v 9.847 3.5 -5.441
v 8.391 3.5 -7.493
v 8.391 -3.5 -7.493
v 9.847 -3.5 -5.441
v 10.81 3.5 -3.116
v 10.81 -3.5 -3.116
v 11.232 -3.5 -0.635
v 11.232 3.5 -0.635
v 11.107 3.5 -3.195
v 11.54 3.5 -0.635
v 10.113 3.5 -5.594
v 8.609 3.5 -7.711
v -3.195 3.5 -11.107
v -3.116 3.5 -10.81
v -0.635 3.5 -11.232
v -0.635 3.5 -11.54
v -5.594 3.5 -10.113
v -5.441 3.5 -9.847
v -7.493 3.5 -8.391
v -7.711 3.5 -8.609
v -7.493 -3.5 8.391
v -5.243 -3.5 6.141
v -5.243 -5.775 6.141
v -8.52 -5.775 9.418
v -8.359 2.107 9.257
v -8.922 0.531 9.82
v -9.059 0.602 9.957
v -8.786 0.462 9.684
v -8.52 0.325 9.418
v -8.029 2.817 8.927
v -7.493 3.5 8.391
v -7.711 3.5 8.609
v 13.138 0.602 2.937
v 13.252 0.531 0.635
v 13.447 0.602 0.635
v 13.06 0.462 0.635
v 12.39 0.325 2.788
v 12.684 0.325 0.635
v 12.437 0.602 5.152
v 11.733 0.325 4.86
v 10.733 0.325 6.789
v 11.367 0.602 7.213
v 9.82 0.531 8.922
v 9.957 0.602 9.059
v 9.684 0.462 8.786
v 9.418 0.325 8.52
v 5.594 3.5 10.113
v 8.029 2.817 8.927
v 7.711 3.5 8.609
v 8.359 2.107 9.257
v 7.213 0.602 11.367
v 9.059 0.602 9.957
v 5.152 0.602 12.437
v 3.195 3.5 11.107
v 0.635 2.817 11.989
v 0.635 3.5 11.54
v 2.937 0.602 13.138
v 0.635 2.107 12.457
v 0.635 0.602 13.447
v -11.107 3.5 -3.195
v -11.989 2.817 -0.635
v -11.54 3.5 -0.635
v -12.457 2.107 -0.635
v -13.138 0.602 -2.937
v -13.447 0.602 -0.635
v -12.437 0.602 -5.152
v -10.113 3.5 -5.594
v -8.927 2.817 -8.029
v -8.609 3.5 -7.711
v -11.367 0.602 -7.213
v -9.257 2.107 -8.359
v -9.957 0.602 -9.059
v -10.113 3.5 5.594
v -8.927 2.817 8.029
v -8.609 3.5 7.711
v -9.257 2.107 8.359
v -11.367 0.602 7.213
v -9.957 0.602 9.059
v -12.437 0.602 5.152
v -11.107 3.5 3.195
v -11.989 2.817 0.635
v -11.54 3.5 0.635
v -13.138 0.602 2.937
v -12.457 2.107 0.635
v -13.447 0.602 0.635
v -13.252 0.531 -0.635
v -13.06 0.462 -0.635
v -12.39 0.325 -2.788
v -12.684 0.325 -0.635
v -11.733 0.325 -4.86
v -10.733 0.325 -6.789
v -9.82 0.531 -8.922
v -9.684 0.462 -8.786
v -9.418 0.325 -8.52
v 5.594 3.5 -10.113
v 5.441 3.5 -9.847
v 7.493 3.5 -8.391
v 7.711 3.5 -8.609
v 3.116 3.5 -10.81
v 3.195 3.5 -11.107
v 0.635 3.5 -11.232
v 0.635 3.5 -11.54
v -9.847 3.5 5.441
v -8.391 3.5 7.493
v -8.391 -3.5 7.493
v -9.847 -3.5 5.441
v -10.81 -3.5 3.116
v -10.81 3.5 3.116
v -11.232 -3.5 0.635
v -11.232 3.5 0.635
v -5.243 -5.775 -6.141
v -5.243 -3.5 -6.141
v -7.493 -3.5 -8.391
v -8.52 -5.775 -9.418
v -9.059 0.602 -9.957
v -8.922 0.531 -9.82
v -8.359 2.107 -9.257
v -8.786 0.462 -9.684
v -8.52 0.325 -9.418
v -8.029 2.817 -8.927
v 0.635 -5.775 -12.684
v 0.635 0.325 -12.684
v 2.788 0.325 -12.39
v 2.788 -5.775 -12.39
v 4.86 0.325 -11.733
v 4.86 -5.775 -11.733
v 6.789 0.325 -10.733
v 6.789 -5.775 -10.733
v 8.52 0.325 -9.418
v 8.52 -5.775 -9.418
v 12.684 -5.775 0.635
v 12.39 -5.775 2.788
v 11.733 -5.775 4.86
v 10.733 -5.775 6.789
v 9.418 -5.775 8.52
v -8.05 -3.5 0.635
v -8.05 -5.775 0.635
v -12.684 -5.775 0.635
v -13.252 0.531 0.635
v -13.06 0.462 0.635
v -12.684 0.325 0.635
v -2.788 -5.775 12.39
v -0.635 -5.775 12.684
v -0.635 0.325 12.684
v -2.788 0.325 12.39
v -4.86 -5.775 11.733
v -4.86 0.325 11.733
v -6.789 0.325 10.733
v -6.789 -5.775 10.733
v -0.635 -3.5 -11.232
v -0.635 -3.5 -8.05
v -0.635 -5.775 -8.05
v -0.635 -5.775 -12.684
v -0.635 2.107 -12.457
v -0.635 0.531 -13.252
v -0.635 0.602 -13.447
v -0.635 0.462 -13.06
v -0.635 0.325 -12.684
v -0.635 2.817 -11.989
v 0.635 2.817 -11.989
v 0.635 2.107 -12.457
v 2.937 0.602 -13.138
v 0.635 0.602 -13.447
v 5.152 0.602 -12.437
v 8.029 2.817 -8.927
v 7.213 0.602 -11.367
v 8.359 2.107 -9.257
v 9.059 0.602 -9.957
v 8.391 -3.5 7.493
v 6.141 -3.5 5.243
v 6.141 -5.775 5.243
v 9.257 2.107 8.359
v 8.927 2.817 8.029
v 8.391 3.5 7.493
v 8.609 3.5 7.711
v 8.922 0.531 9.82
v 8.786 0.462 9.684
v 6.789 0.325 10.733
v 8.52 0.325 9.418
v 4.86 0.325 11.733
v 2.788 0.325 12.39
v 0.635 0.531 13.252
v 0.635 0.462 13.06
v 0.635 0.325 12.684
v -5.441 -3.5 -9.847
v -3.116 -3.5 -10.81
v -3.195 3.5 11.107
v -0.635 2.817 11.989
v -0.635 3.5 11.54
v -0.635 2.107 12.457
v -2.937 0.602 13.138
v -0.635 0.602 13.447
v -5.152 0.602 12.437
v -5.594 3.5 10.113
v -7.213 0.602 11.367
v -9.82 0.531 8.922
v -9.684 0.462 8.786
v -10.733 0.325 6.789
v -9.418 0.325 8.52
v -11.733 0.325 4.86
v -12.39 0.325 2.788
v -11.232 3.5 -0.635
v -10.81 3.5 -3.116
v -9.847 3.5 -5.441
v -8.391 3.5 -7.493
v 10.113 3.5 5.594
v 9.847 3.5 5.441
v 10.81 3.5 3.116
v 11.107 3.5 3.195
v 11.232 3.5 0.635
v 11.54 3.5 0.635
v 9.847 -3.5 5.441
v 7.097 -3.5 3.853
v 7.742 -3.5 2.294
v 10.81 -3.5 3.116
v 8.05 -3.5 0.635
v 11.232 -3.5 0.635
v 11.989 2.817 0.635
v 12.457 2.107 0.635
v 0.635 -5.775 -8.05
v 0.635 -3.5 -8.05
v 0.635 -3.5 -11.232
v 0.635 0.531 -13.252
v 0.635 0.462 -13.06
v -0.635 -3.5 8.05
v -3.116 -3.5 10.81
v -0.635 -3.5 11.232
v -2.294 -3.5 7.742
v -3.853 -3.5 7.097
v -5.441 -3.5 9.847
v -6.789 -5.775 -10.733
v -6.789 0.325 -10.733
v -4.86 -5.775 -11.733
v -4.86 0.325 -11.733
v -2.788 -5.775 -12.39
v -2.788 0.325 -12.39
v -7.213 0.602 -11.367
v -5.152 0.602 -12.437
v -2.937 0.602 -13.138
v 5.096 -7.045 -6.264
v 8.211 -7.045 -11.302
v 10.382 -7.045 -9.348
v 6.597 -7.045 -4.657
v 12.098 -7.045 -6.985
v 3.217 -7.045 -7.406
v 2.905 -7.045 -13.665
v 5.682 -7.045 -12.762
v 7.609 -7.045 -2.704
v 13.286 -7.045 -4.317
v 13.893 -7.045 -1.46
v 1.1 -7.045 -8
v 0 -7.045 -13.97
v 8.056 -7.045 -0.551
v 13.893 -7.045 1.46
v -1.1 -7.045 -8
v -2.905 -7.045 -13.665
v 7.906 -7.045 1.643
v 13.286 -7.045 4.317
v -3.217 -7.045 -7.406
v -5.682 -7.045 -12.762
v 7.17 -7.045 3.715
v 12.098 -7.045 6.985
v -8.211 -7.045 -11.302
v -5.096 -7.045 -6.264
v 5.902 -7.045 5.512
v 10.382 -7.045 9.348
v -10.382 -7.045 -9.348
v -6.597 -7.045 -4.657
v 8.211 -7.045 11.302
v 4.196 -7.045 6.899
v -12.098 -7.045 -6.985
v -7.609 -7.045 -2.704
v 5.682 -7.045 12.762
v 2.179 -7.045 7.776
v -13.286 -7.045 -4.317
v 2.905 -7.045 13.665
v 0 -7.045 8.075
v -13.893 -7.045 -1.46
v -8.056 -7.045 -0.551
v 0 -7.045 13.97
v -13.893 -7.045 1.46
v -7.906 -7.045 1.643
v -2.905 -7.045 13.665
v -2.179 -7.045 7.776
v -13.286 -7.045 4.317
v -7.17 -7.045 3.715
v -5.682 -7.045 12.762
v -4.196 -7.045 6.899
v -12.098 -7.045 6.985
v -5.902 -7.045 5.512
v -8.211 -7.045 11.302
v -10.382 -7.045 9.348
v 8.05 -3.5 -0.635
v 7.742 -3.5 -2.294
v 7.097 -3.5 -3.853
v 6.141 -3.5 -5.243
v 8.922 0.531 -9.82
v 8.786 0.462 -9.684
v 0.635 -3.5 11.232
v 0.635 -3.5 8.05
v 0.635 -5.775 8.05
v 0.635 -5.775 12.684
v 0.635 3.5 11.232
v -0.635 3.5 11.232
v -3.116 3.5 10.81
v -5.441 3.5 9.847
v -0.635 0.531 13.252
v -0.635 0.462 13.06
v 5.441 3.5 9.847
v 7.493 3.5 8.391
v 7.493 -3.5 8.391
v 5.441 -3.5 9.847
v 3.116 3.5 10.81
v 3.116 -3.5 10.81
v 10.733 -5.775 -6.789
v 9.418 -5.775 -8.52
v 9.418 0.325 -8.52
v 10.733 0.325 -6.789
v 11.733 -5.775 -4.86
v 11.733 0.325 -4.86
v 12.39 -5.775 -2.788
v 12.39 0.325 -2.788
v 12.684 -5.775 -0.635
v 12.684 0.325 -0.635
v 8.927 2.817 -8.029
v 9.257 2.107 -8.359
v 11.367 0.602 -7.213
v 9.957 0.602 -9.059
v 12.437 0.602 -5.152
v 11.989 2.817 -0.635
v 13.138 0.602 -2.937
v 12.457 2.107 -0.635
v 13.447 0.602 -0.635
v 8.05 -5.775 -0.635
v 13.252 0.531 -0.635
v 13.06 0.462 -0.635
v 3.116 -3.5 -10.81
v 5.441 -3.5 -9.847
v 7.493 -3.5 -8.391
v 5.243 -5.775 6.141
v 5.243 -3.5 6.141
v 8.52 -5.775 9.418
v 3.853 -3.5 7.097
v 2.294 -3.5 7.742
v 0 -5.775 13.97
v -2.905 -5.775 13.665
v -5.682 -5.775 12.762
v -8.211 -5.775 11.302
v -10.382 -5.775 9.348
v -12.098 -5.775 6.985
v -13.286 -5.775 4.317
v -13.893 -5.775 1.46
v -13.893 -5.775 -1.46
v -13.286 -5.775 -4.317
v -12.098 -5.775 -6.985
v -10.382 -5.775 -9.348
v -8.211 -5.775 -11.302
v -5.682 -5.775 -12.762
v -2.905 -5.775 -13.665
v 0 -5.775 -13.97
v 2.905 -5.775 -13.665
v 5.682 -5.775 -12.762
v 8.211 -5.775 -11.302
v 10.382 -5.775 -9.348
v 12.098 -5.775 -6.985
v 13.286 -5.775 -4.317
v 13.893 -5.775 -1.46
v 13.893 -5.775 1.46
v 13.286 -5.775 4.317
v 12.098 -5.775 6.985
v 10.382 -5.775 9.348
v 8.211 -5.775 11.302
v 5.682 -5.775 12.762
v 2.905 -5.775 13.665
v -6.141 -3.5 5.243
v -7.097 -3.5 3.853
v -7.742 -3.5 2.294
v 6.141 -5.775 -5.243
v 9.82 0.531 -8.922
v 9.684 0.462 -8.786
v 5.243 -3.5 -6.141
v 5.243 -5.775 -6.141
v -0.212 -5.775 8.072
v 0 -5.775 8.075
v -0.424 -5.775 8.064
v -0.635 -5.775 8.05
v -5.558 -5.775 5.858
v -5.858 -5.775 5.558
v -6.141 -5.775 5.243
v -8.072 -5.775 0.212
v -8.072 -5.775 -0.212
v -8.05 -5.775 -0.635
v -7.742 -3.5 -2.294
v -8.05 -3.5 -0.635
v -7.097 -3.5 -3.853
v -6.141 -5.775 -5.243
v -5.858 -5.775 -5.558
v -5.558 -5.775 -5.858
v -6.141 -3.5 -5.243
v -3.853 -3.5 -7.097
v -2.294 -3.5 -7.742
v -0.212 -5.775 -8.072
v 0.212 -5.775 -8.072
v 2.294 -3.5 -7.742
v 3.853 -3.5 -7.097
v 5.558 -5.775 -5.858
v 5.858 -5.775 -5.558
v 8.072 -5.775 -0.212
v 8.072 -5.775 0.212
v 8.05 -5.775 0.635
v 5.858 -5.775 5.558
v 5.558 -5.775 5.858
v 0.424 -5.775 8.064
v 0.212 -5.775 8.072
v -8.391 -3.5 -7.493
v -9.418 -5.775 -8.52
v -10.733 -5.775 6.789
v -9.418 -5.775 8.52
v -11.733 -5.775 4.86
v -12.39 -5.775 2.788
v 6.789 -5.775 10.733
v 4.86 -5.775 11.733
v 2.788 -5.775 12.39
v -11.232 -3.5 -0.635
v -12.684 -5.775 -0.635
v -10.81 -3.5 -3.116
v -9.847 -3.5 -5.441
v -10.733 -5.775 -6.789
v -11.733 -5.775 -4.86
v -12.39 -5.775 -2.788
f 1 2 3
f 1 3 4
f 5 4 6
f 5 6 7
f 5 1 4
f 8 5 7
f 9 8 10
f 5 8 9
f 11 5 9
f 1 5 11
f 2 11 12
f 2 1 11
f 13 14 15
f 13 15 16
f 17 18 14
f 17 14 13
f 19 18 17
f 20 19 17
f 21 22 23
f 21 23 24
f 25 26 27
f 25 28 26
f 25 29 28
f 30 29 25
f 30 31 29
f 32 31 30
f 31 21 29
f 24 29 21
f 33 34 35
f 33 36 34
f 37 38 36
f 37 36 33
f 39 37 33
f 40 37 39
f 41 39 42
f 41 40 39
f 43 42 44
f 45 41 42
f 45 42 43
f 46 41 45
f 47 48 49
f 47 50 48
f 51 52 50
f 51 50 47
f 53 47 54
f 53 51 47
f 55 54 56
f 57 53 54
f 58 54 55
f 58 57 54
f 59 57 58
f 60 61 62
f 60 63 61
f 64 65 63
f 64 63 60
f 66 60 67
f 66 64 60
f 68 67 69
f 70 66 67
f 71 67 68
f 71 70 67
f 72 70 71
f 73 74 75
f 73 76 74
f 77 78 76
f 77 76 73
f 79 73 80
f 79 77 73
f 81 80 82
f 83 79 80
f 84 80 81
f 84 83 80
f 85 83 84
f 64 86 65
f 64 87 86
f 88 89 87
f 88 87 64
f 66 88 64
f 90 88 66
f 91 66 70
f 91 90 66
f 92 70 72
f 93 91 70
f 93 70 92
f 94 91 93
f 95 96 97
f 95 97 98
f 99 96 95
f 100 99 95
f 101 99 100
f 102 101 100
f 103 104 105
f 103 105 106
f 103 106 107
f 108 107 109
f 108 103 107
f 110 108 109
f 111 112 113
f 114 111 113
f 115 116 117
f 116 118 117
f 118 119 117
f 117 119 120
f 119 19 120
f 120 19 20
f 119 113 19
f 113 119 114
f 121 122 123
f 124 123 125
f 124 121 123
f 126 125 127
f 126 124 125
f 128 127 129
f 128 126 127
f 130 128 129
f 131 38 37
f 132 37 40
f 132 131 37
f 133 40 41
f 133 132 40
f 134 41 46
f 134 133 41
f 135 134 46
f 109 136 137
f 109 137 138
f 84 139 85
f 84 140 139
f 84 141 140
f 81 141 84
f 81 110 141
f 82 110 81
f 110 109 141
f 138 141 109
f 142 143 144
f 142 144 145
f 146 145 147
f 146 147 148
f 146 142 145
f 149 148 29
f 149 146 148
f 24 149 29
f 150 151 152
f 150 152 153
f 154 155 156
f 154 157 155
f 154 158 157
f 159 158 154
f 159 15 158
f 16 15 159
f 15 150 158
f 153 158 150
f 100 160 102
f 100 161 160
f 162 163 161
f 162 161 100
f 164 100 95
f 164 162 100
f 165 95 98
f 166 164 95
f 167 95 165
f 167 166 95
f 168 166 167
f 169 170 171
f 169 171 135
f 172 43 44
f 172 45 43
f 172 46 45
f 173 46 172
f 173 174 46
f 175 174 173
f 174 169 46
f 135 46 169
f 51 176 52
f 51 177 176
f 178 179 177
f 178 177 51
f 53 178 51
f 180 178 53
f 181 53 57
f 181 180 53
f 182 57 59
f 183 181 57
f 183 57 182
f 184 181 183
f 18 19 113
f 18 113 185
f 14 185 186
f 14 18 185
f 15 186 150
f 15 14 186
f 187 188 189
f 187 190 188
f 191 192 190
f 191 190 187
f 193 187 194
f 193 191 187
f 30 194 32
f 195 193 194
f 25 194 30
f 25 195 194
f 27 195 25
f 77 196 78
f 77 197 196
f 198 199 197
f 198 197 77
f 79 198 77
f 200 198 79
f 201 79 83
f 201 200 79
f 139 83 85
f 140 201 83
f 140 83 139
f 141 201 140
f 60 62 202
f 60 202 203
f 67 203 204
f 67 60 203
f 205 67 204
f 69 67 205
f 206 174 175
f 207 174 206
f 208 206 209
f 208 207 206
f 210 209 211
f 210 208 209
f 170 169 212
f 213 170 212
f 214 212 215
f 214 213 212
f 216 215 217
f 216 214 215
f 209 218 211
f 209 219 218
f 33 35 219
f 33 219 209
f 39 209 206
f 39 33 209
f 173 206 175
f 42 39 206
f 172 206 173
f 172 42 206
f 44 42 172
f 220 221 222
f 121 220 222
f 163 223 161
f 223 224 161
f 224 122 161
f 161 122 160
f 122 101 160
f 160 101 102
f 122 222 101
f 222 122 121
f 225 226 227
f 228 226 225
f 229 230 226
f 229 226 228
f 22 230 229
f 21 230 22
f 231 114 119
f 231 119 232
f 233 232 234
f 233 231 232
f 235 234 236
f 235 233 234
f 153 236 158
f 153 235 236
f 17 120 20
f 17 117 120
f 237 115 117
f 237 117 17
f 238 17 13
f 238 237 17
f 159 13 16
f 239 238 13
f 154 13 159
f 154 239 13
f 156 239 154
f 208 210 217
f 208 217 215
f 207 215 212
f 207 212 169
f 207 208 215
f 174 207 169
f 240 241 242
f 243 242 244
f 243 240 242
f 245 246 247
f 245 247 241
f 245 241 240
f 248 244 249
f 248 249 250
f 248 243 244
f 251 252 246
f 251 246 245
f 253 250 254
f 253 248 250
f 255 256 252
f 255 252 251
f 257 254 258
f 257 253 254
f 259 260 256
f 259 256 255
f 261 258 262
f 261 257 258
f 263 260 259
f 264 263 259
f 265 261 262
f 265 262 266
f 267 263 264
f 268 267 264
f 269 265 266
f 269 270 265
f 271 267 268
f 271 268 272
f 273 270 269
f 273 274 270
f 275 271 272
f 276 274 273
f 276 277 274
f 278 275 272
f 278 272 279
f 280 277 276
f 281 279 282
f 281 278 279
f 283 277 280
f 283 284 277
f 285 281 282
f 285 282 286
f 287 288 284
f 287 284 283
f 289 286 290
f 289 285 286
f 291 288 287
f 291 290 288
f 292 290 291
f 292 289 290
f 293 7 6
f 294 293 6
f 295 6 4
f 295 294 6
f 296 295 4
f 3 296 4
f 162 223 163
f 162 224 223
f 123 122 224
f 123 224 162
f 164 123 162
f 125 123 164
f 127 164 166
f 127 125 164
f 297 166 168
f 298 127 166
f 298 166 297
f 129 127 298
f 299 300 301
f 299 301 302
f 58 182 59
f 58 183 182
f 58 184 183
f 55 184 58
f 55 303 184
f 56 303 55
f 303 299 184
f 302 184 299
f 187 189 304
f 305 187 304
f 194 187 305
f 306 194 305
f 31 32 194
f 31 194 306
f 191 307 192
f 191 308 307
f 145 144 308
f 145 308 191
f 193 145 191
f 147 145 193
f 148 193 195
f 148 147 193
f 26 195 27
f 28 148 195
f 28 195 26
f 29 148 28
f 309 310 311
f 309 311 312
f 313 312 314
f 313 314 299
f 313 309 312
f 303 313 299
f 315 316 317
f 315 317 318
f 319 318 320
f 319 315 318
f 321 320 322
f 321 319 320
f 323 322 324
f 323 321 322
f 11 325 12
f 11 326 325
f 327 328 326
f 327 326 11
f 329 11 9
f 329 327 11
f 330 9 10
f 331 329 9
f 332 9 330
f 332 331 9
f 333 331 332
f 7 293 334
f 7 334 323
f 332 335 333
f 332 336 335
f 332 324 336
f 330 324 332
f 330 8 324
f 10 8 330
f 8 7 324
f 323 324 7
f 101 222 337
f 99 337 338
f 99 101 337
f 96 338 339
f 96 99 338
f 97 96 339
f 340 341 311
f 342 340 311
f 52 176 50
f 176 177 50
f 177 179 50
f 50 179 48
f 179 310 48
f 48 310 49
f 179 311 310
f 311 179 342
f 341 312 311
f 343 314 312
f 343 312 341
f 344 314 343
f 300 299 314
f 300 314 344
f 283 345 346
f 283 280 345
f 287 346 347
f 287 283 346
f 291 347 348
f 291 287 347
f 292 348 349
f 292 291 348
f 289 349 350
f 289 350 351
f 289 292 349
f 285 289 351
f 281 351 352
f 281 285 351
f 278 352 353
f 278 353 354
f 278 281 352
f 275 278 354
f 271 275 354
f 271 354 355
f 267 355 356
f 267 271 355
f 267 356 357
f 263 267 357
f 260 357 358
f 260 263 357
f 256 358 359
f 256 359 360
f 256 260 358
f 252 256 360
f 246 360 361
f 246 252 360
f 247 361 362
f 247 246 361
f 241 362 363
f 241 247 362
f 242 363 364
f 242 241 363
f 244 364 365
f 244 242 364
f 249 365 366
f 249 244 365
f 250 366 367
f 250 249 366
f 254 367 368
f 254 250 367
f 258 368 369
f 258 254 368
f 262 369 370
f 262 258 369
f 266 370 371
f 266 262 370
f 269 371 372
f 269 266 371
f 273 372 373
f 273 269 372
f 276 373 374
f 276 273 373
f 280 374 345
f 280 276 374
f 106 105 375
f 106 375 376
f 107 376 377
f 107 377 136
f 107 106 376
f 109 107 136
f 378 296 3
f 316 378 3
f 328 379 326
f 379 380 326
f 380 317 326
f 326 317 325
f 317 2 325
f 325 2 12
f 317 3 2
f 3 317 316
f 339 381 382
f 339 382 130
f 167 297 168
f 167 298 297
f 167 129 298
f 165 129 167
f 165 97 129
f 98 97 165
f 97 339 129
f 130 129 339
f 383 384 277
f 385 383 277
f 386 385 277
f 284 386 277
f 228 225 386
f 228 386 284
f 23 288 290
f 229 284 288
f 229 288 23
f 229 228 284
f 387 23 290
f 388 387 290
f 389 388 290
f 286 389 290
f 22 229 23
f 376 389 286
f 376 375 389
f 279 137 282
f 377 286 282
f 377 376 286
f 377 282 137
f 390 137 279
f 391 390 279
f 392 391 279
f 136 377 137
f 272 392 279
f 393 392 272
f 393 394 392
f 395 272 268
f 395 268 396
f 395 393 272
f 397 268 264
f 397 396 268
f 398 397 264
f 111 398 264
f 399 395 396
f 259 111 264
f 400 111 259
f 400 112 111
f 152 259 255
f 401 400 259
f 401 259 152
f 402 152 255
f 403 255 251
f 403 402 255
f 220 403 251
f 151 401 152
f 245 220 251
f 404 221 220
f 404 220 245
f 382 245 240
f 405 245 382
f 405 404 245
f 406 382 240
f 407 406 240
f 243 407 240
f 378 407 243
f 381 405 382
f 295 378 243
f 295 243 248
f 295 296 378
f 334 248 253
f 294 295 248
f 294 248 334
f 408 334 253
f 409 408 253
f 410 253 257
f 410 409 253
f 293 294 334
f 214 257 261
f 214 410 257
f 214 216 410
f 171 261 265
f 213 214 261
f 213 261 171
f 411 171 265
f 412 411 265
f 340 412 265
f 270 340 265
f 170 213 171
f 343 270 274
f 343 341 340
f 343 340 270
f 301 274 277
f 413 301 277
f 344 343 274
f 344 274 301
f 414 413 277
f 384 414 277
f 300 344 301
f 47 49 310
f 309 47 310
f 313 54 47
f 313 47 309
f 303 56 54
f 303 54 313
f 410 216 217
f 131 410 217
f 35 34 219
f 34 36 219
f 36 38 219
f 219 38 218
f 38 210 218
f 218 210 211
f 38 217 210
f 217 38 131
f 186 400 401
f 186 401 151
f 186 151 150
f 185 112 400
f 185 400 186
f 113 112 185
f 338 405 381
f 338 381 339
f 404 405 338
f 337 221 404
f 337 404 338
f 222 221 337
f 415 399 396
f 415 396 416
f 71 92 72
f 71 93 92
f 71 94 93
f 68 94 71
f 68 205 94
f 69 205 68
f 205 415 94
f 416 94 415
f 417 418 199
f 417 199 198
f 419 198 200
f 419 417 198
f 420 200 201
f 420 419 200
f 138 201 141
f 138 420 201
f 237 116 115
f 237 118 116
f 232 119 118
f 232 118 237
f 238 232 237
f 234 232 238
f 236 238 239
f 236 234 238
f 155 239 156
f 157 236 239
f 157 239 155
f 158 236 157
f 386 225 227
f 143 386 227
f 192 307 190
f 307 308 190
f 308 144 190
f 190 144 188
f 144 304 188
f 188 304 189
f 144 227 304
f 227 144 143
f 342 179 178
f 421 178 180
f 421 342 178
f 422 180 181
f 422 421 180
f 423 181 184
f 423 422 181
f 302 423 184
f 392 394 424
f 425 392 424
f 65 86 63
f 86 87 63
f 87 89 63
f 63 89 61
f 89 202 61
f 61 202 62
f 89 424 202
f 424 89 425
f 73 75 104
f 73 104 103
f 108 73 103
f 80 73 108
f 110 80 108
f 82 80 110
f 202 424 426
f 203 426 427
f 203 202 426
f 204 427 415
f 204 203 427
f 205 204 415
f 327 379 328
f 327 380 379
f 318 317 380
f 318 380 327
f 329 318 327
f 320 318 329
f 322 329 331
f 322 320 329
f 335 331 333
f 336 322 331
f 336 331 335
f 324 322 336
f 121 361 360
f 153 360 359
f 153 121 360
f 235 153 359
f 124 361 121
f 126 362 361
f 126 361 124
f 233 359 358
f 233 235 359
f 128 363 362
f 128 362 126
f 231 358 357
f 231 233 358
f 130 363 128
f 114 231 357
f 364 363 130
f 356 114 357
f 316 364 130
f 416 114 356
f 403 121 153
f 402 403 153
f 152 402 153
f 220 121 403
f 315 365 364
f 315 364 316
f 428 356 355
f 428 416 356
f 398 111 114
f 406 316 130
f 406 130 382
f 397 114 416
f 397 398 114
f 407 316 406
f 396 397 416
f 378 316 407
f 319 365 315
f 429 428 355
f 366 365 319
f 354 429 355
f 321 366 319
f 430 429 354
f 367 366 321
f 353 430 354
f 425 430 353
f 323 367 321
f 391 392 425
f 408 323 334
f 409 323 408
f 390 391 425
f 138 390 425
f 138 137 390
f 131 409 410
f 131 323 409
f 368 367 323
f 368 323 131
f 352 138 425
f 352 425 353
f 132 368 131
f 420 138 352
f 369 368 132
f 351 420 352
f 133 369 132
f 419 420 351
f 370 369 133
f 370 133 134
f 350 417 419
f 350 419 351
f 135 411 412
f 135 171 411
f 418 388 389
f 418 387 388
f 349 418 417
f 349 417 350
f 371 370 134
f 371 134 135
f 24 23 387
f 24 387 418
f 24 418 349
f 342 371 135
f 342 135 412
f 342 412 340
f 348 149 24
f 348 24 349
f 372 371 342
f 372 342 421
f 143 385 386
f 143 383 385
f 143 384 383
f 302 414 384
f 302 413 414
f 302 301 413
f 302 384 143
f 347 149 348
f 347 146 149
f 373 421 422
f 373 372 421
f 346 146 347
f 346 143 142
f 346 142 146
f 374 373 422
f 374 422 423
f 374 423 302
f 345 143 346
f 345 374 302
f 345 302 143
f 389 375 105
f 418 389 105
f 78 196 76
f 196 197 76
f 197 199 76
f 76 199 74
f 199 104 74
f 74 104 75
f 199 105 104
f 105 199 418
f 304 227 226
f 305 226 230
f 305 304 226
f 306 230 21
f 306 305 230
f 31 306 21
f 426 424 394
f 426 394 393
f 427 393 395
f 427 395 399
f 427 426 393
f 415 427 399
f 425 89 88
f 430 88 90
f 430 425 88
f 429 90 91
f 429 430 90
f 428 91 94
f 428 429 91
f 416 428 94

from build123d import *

# Parameters (mm, degrees)
CUT_EXTRUDE3_REACH             = 24.395
SKETCH6_W                      = 1.27
SKETCH6_H                      = 13.462
CUT_EXTRUDE3_DIRECTION_2_DEPTH = 23.394615982
CIRPATTERN1_COUNT              = 8


with BuildPart() as part:
    # Sketch5 → Revolve1 (revolve)
    with BuildSketch(Plane.XY, mode=Mode.PRIVATE) as revolve1_sk:
        Polygon((-11.249999979, -3.5), (-11.249999979, 3.5), (-11.557, 3.5), (-13.462, 0.602345319), (-12.7, 0.325), (-12.7, -5.775), (-13.97, -5.775), (-13.97, -7.045), (-8.074999979, -7.045), (-8.074999979, -3.5), align=None)
    revolve(revolve1_sk.sketch.rotate(Axis((0, 0.325, 0), (0, -1, 0)), 270), axis=Axis((0, 0.325, 0), (0, -1, 0)))

    # Cut-Extrude3: up to this face of the body (flat: up to its plane)
    cut_extrude3_end = Plane(part.part.faces().sort_by_distance((0, -5.775, -13.095131269))[0])
    # Sketch6 → Cut-Extrude3 (cut, up to the picked face)
    with BuildSketch(Plane(origin=(0, 3.5, 0), x_dir=(1, 0, 0), z_dir=(0, 1, 0)), mode=Mode.PRIVATE) as cut_extrude3_sk1:
        with Locations((0, 6.731)):
            Rectangle(SKETCH6_W, SKETCH6_H)
    cut_extrude3_tool1 = split(extrude(cut_extrude3_sk1.sketch, amount=-CUT_EXTRUDE3_REACH, mode=Mode.PRIVATE), bisect_by=cut_extrude3_end, keep=Keep.BOTH, mode=Mode.PRIVATE)
    cut_extrude3 = cut_extrude3_tool1.solids().sort_by(Axis((0, 3.5, -6.731), (0, -1, 0)))[0]
    add(cut_extrude3, mode=Mode.SUBTRACT)

    # Sketch6 → Cut-Extrude3 direction 2 (cut)
    with BuildSketch(Plane(origin=(0, 3.5, 0), x_dir=(1, 0, 0), z_dir=(0, 1, 0))):
        with Locations((0, 6.731)):
            Rectangle(SKETCH6_W, SKETCH6_H)
    cut_extrude3_direction_2 = extrude(amount=CUT_EXTRUDE3_DIRECTION_2_DEPTH, mode=Mode.SUBTRACT)

    # CirPattern1: Cut-Extrude3, Cut-Extrude3 direction 2 ×8 about axis
    cirpattern1_axis = Axis((0, 0, 0), (0, 1, 0))
    add([cut_extrude3.rotate(cirpattern1_axis, i * 360 / CIRPATTERN1_COUNT) for i in range(1, CIRPATTERN1_COUNT)], mode=Mode.SUBTRACT)
    add([cut_extrude3_direction_2.rotate(cirpattern1_axis, i * 360 / CIRPATTERN1_COUNT) for i in range(1, CIRPATTERN1_COUNT)], mode=Mode.SUBTRACT)


solid = part.part
